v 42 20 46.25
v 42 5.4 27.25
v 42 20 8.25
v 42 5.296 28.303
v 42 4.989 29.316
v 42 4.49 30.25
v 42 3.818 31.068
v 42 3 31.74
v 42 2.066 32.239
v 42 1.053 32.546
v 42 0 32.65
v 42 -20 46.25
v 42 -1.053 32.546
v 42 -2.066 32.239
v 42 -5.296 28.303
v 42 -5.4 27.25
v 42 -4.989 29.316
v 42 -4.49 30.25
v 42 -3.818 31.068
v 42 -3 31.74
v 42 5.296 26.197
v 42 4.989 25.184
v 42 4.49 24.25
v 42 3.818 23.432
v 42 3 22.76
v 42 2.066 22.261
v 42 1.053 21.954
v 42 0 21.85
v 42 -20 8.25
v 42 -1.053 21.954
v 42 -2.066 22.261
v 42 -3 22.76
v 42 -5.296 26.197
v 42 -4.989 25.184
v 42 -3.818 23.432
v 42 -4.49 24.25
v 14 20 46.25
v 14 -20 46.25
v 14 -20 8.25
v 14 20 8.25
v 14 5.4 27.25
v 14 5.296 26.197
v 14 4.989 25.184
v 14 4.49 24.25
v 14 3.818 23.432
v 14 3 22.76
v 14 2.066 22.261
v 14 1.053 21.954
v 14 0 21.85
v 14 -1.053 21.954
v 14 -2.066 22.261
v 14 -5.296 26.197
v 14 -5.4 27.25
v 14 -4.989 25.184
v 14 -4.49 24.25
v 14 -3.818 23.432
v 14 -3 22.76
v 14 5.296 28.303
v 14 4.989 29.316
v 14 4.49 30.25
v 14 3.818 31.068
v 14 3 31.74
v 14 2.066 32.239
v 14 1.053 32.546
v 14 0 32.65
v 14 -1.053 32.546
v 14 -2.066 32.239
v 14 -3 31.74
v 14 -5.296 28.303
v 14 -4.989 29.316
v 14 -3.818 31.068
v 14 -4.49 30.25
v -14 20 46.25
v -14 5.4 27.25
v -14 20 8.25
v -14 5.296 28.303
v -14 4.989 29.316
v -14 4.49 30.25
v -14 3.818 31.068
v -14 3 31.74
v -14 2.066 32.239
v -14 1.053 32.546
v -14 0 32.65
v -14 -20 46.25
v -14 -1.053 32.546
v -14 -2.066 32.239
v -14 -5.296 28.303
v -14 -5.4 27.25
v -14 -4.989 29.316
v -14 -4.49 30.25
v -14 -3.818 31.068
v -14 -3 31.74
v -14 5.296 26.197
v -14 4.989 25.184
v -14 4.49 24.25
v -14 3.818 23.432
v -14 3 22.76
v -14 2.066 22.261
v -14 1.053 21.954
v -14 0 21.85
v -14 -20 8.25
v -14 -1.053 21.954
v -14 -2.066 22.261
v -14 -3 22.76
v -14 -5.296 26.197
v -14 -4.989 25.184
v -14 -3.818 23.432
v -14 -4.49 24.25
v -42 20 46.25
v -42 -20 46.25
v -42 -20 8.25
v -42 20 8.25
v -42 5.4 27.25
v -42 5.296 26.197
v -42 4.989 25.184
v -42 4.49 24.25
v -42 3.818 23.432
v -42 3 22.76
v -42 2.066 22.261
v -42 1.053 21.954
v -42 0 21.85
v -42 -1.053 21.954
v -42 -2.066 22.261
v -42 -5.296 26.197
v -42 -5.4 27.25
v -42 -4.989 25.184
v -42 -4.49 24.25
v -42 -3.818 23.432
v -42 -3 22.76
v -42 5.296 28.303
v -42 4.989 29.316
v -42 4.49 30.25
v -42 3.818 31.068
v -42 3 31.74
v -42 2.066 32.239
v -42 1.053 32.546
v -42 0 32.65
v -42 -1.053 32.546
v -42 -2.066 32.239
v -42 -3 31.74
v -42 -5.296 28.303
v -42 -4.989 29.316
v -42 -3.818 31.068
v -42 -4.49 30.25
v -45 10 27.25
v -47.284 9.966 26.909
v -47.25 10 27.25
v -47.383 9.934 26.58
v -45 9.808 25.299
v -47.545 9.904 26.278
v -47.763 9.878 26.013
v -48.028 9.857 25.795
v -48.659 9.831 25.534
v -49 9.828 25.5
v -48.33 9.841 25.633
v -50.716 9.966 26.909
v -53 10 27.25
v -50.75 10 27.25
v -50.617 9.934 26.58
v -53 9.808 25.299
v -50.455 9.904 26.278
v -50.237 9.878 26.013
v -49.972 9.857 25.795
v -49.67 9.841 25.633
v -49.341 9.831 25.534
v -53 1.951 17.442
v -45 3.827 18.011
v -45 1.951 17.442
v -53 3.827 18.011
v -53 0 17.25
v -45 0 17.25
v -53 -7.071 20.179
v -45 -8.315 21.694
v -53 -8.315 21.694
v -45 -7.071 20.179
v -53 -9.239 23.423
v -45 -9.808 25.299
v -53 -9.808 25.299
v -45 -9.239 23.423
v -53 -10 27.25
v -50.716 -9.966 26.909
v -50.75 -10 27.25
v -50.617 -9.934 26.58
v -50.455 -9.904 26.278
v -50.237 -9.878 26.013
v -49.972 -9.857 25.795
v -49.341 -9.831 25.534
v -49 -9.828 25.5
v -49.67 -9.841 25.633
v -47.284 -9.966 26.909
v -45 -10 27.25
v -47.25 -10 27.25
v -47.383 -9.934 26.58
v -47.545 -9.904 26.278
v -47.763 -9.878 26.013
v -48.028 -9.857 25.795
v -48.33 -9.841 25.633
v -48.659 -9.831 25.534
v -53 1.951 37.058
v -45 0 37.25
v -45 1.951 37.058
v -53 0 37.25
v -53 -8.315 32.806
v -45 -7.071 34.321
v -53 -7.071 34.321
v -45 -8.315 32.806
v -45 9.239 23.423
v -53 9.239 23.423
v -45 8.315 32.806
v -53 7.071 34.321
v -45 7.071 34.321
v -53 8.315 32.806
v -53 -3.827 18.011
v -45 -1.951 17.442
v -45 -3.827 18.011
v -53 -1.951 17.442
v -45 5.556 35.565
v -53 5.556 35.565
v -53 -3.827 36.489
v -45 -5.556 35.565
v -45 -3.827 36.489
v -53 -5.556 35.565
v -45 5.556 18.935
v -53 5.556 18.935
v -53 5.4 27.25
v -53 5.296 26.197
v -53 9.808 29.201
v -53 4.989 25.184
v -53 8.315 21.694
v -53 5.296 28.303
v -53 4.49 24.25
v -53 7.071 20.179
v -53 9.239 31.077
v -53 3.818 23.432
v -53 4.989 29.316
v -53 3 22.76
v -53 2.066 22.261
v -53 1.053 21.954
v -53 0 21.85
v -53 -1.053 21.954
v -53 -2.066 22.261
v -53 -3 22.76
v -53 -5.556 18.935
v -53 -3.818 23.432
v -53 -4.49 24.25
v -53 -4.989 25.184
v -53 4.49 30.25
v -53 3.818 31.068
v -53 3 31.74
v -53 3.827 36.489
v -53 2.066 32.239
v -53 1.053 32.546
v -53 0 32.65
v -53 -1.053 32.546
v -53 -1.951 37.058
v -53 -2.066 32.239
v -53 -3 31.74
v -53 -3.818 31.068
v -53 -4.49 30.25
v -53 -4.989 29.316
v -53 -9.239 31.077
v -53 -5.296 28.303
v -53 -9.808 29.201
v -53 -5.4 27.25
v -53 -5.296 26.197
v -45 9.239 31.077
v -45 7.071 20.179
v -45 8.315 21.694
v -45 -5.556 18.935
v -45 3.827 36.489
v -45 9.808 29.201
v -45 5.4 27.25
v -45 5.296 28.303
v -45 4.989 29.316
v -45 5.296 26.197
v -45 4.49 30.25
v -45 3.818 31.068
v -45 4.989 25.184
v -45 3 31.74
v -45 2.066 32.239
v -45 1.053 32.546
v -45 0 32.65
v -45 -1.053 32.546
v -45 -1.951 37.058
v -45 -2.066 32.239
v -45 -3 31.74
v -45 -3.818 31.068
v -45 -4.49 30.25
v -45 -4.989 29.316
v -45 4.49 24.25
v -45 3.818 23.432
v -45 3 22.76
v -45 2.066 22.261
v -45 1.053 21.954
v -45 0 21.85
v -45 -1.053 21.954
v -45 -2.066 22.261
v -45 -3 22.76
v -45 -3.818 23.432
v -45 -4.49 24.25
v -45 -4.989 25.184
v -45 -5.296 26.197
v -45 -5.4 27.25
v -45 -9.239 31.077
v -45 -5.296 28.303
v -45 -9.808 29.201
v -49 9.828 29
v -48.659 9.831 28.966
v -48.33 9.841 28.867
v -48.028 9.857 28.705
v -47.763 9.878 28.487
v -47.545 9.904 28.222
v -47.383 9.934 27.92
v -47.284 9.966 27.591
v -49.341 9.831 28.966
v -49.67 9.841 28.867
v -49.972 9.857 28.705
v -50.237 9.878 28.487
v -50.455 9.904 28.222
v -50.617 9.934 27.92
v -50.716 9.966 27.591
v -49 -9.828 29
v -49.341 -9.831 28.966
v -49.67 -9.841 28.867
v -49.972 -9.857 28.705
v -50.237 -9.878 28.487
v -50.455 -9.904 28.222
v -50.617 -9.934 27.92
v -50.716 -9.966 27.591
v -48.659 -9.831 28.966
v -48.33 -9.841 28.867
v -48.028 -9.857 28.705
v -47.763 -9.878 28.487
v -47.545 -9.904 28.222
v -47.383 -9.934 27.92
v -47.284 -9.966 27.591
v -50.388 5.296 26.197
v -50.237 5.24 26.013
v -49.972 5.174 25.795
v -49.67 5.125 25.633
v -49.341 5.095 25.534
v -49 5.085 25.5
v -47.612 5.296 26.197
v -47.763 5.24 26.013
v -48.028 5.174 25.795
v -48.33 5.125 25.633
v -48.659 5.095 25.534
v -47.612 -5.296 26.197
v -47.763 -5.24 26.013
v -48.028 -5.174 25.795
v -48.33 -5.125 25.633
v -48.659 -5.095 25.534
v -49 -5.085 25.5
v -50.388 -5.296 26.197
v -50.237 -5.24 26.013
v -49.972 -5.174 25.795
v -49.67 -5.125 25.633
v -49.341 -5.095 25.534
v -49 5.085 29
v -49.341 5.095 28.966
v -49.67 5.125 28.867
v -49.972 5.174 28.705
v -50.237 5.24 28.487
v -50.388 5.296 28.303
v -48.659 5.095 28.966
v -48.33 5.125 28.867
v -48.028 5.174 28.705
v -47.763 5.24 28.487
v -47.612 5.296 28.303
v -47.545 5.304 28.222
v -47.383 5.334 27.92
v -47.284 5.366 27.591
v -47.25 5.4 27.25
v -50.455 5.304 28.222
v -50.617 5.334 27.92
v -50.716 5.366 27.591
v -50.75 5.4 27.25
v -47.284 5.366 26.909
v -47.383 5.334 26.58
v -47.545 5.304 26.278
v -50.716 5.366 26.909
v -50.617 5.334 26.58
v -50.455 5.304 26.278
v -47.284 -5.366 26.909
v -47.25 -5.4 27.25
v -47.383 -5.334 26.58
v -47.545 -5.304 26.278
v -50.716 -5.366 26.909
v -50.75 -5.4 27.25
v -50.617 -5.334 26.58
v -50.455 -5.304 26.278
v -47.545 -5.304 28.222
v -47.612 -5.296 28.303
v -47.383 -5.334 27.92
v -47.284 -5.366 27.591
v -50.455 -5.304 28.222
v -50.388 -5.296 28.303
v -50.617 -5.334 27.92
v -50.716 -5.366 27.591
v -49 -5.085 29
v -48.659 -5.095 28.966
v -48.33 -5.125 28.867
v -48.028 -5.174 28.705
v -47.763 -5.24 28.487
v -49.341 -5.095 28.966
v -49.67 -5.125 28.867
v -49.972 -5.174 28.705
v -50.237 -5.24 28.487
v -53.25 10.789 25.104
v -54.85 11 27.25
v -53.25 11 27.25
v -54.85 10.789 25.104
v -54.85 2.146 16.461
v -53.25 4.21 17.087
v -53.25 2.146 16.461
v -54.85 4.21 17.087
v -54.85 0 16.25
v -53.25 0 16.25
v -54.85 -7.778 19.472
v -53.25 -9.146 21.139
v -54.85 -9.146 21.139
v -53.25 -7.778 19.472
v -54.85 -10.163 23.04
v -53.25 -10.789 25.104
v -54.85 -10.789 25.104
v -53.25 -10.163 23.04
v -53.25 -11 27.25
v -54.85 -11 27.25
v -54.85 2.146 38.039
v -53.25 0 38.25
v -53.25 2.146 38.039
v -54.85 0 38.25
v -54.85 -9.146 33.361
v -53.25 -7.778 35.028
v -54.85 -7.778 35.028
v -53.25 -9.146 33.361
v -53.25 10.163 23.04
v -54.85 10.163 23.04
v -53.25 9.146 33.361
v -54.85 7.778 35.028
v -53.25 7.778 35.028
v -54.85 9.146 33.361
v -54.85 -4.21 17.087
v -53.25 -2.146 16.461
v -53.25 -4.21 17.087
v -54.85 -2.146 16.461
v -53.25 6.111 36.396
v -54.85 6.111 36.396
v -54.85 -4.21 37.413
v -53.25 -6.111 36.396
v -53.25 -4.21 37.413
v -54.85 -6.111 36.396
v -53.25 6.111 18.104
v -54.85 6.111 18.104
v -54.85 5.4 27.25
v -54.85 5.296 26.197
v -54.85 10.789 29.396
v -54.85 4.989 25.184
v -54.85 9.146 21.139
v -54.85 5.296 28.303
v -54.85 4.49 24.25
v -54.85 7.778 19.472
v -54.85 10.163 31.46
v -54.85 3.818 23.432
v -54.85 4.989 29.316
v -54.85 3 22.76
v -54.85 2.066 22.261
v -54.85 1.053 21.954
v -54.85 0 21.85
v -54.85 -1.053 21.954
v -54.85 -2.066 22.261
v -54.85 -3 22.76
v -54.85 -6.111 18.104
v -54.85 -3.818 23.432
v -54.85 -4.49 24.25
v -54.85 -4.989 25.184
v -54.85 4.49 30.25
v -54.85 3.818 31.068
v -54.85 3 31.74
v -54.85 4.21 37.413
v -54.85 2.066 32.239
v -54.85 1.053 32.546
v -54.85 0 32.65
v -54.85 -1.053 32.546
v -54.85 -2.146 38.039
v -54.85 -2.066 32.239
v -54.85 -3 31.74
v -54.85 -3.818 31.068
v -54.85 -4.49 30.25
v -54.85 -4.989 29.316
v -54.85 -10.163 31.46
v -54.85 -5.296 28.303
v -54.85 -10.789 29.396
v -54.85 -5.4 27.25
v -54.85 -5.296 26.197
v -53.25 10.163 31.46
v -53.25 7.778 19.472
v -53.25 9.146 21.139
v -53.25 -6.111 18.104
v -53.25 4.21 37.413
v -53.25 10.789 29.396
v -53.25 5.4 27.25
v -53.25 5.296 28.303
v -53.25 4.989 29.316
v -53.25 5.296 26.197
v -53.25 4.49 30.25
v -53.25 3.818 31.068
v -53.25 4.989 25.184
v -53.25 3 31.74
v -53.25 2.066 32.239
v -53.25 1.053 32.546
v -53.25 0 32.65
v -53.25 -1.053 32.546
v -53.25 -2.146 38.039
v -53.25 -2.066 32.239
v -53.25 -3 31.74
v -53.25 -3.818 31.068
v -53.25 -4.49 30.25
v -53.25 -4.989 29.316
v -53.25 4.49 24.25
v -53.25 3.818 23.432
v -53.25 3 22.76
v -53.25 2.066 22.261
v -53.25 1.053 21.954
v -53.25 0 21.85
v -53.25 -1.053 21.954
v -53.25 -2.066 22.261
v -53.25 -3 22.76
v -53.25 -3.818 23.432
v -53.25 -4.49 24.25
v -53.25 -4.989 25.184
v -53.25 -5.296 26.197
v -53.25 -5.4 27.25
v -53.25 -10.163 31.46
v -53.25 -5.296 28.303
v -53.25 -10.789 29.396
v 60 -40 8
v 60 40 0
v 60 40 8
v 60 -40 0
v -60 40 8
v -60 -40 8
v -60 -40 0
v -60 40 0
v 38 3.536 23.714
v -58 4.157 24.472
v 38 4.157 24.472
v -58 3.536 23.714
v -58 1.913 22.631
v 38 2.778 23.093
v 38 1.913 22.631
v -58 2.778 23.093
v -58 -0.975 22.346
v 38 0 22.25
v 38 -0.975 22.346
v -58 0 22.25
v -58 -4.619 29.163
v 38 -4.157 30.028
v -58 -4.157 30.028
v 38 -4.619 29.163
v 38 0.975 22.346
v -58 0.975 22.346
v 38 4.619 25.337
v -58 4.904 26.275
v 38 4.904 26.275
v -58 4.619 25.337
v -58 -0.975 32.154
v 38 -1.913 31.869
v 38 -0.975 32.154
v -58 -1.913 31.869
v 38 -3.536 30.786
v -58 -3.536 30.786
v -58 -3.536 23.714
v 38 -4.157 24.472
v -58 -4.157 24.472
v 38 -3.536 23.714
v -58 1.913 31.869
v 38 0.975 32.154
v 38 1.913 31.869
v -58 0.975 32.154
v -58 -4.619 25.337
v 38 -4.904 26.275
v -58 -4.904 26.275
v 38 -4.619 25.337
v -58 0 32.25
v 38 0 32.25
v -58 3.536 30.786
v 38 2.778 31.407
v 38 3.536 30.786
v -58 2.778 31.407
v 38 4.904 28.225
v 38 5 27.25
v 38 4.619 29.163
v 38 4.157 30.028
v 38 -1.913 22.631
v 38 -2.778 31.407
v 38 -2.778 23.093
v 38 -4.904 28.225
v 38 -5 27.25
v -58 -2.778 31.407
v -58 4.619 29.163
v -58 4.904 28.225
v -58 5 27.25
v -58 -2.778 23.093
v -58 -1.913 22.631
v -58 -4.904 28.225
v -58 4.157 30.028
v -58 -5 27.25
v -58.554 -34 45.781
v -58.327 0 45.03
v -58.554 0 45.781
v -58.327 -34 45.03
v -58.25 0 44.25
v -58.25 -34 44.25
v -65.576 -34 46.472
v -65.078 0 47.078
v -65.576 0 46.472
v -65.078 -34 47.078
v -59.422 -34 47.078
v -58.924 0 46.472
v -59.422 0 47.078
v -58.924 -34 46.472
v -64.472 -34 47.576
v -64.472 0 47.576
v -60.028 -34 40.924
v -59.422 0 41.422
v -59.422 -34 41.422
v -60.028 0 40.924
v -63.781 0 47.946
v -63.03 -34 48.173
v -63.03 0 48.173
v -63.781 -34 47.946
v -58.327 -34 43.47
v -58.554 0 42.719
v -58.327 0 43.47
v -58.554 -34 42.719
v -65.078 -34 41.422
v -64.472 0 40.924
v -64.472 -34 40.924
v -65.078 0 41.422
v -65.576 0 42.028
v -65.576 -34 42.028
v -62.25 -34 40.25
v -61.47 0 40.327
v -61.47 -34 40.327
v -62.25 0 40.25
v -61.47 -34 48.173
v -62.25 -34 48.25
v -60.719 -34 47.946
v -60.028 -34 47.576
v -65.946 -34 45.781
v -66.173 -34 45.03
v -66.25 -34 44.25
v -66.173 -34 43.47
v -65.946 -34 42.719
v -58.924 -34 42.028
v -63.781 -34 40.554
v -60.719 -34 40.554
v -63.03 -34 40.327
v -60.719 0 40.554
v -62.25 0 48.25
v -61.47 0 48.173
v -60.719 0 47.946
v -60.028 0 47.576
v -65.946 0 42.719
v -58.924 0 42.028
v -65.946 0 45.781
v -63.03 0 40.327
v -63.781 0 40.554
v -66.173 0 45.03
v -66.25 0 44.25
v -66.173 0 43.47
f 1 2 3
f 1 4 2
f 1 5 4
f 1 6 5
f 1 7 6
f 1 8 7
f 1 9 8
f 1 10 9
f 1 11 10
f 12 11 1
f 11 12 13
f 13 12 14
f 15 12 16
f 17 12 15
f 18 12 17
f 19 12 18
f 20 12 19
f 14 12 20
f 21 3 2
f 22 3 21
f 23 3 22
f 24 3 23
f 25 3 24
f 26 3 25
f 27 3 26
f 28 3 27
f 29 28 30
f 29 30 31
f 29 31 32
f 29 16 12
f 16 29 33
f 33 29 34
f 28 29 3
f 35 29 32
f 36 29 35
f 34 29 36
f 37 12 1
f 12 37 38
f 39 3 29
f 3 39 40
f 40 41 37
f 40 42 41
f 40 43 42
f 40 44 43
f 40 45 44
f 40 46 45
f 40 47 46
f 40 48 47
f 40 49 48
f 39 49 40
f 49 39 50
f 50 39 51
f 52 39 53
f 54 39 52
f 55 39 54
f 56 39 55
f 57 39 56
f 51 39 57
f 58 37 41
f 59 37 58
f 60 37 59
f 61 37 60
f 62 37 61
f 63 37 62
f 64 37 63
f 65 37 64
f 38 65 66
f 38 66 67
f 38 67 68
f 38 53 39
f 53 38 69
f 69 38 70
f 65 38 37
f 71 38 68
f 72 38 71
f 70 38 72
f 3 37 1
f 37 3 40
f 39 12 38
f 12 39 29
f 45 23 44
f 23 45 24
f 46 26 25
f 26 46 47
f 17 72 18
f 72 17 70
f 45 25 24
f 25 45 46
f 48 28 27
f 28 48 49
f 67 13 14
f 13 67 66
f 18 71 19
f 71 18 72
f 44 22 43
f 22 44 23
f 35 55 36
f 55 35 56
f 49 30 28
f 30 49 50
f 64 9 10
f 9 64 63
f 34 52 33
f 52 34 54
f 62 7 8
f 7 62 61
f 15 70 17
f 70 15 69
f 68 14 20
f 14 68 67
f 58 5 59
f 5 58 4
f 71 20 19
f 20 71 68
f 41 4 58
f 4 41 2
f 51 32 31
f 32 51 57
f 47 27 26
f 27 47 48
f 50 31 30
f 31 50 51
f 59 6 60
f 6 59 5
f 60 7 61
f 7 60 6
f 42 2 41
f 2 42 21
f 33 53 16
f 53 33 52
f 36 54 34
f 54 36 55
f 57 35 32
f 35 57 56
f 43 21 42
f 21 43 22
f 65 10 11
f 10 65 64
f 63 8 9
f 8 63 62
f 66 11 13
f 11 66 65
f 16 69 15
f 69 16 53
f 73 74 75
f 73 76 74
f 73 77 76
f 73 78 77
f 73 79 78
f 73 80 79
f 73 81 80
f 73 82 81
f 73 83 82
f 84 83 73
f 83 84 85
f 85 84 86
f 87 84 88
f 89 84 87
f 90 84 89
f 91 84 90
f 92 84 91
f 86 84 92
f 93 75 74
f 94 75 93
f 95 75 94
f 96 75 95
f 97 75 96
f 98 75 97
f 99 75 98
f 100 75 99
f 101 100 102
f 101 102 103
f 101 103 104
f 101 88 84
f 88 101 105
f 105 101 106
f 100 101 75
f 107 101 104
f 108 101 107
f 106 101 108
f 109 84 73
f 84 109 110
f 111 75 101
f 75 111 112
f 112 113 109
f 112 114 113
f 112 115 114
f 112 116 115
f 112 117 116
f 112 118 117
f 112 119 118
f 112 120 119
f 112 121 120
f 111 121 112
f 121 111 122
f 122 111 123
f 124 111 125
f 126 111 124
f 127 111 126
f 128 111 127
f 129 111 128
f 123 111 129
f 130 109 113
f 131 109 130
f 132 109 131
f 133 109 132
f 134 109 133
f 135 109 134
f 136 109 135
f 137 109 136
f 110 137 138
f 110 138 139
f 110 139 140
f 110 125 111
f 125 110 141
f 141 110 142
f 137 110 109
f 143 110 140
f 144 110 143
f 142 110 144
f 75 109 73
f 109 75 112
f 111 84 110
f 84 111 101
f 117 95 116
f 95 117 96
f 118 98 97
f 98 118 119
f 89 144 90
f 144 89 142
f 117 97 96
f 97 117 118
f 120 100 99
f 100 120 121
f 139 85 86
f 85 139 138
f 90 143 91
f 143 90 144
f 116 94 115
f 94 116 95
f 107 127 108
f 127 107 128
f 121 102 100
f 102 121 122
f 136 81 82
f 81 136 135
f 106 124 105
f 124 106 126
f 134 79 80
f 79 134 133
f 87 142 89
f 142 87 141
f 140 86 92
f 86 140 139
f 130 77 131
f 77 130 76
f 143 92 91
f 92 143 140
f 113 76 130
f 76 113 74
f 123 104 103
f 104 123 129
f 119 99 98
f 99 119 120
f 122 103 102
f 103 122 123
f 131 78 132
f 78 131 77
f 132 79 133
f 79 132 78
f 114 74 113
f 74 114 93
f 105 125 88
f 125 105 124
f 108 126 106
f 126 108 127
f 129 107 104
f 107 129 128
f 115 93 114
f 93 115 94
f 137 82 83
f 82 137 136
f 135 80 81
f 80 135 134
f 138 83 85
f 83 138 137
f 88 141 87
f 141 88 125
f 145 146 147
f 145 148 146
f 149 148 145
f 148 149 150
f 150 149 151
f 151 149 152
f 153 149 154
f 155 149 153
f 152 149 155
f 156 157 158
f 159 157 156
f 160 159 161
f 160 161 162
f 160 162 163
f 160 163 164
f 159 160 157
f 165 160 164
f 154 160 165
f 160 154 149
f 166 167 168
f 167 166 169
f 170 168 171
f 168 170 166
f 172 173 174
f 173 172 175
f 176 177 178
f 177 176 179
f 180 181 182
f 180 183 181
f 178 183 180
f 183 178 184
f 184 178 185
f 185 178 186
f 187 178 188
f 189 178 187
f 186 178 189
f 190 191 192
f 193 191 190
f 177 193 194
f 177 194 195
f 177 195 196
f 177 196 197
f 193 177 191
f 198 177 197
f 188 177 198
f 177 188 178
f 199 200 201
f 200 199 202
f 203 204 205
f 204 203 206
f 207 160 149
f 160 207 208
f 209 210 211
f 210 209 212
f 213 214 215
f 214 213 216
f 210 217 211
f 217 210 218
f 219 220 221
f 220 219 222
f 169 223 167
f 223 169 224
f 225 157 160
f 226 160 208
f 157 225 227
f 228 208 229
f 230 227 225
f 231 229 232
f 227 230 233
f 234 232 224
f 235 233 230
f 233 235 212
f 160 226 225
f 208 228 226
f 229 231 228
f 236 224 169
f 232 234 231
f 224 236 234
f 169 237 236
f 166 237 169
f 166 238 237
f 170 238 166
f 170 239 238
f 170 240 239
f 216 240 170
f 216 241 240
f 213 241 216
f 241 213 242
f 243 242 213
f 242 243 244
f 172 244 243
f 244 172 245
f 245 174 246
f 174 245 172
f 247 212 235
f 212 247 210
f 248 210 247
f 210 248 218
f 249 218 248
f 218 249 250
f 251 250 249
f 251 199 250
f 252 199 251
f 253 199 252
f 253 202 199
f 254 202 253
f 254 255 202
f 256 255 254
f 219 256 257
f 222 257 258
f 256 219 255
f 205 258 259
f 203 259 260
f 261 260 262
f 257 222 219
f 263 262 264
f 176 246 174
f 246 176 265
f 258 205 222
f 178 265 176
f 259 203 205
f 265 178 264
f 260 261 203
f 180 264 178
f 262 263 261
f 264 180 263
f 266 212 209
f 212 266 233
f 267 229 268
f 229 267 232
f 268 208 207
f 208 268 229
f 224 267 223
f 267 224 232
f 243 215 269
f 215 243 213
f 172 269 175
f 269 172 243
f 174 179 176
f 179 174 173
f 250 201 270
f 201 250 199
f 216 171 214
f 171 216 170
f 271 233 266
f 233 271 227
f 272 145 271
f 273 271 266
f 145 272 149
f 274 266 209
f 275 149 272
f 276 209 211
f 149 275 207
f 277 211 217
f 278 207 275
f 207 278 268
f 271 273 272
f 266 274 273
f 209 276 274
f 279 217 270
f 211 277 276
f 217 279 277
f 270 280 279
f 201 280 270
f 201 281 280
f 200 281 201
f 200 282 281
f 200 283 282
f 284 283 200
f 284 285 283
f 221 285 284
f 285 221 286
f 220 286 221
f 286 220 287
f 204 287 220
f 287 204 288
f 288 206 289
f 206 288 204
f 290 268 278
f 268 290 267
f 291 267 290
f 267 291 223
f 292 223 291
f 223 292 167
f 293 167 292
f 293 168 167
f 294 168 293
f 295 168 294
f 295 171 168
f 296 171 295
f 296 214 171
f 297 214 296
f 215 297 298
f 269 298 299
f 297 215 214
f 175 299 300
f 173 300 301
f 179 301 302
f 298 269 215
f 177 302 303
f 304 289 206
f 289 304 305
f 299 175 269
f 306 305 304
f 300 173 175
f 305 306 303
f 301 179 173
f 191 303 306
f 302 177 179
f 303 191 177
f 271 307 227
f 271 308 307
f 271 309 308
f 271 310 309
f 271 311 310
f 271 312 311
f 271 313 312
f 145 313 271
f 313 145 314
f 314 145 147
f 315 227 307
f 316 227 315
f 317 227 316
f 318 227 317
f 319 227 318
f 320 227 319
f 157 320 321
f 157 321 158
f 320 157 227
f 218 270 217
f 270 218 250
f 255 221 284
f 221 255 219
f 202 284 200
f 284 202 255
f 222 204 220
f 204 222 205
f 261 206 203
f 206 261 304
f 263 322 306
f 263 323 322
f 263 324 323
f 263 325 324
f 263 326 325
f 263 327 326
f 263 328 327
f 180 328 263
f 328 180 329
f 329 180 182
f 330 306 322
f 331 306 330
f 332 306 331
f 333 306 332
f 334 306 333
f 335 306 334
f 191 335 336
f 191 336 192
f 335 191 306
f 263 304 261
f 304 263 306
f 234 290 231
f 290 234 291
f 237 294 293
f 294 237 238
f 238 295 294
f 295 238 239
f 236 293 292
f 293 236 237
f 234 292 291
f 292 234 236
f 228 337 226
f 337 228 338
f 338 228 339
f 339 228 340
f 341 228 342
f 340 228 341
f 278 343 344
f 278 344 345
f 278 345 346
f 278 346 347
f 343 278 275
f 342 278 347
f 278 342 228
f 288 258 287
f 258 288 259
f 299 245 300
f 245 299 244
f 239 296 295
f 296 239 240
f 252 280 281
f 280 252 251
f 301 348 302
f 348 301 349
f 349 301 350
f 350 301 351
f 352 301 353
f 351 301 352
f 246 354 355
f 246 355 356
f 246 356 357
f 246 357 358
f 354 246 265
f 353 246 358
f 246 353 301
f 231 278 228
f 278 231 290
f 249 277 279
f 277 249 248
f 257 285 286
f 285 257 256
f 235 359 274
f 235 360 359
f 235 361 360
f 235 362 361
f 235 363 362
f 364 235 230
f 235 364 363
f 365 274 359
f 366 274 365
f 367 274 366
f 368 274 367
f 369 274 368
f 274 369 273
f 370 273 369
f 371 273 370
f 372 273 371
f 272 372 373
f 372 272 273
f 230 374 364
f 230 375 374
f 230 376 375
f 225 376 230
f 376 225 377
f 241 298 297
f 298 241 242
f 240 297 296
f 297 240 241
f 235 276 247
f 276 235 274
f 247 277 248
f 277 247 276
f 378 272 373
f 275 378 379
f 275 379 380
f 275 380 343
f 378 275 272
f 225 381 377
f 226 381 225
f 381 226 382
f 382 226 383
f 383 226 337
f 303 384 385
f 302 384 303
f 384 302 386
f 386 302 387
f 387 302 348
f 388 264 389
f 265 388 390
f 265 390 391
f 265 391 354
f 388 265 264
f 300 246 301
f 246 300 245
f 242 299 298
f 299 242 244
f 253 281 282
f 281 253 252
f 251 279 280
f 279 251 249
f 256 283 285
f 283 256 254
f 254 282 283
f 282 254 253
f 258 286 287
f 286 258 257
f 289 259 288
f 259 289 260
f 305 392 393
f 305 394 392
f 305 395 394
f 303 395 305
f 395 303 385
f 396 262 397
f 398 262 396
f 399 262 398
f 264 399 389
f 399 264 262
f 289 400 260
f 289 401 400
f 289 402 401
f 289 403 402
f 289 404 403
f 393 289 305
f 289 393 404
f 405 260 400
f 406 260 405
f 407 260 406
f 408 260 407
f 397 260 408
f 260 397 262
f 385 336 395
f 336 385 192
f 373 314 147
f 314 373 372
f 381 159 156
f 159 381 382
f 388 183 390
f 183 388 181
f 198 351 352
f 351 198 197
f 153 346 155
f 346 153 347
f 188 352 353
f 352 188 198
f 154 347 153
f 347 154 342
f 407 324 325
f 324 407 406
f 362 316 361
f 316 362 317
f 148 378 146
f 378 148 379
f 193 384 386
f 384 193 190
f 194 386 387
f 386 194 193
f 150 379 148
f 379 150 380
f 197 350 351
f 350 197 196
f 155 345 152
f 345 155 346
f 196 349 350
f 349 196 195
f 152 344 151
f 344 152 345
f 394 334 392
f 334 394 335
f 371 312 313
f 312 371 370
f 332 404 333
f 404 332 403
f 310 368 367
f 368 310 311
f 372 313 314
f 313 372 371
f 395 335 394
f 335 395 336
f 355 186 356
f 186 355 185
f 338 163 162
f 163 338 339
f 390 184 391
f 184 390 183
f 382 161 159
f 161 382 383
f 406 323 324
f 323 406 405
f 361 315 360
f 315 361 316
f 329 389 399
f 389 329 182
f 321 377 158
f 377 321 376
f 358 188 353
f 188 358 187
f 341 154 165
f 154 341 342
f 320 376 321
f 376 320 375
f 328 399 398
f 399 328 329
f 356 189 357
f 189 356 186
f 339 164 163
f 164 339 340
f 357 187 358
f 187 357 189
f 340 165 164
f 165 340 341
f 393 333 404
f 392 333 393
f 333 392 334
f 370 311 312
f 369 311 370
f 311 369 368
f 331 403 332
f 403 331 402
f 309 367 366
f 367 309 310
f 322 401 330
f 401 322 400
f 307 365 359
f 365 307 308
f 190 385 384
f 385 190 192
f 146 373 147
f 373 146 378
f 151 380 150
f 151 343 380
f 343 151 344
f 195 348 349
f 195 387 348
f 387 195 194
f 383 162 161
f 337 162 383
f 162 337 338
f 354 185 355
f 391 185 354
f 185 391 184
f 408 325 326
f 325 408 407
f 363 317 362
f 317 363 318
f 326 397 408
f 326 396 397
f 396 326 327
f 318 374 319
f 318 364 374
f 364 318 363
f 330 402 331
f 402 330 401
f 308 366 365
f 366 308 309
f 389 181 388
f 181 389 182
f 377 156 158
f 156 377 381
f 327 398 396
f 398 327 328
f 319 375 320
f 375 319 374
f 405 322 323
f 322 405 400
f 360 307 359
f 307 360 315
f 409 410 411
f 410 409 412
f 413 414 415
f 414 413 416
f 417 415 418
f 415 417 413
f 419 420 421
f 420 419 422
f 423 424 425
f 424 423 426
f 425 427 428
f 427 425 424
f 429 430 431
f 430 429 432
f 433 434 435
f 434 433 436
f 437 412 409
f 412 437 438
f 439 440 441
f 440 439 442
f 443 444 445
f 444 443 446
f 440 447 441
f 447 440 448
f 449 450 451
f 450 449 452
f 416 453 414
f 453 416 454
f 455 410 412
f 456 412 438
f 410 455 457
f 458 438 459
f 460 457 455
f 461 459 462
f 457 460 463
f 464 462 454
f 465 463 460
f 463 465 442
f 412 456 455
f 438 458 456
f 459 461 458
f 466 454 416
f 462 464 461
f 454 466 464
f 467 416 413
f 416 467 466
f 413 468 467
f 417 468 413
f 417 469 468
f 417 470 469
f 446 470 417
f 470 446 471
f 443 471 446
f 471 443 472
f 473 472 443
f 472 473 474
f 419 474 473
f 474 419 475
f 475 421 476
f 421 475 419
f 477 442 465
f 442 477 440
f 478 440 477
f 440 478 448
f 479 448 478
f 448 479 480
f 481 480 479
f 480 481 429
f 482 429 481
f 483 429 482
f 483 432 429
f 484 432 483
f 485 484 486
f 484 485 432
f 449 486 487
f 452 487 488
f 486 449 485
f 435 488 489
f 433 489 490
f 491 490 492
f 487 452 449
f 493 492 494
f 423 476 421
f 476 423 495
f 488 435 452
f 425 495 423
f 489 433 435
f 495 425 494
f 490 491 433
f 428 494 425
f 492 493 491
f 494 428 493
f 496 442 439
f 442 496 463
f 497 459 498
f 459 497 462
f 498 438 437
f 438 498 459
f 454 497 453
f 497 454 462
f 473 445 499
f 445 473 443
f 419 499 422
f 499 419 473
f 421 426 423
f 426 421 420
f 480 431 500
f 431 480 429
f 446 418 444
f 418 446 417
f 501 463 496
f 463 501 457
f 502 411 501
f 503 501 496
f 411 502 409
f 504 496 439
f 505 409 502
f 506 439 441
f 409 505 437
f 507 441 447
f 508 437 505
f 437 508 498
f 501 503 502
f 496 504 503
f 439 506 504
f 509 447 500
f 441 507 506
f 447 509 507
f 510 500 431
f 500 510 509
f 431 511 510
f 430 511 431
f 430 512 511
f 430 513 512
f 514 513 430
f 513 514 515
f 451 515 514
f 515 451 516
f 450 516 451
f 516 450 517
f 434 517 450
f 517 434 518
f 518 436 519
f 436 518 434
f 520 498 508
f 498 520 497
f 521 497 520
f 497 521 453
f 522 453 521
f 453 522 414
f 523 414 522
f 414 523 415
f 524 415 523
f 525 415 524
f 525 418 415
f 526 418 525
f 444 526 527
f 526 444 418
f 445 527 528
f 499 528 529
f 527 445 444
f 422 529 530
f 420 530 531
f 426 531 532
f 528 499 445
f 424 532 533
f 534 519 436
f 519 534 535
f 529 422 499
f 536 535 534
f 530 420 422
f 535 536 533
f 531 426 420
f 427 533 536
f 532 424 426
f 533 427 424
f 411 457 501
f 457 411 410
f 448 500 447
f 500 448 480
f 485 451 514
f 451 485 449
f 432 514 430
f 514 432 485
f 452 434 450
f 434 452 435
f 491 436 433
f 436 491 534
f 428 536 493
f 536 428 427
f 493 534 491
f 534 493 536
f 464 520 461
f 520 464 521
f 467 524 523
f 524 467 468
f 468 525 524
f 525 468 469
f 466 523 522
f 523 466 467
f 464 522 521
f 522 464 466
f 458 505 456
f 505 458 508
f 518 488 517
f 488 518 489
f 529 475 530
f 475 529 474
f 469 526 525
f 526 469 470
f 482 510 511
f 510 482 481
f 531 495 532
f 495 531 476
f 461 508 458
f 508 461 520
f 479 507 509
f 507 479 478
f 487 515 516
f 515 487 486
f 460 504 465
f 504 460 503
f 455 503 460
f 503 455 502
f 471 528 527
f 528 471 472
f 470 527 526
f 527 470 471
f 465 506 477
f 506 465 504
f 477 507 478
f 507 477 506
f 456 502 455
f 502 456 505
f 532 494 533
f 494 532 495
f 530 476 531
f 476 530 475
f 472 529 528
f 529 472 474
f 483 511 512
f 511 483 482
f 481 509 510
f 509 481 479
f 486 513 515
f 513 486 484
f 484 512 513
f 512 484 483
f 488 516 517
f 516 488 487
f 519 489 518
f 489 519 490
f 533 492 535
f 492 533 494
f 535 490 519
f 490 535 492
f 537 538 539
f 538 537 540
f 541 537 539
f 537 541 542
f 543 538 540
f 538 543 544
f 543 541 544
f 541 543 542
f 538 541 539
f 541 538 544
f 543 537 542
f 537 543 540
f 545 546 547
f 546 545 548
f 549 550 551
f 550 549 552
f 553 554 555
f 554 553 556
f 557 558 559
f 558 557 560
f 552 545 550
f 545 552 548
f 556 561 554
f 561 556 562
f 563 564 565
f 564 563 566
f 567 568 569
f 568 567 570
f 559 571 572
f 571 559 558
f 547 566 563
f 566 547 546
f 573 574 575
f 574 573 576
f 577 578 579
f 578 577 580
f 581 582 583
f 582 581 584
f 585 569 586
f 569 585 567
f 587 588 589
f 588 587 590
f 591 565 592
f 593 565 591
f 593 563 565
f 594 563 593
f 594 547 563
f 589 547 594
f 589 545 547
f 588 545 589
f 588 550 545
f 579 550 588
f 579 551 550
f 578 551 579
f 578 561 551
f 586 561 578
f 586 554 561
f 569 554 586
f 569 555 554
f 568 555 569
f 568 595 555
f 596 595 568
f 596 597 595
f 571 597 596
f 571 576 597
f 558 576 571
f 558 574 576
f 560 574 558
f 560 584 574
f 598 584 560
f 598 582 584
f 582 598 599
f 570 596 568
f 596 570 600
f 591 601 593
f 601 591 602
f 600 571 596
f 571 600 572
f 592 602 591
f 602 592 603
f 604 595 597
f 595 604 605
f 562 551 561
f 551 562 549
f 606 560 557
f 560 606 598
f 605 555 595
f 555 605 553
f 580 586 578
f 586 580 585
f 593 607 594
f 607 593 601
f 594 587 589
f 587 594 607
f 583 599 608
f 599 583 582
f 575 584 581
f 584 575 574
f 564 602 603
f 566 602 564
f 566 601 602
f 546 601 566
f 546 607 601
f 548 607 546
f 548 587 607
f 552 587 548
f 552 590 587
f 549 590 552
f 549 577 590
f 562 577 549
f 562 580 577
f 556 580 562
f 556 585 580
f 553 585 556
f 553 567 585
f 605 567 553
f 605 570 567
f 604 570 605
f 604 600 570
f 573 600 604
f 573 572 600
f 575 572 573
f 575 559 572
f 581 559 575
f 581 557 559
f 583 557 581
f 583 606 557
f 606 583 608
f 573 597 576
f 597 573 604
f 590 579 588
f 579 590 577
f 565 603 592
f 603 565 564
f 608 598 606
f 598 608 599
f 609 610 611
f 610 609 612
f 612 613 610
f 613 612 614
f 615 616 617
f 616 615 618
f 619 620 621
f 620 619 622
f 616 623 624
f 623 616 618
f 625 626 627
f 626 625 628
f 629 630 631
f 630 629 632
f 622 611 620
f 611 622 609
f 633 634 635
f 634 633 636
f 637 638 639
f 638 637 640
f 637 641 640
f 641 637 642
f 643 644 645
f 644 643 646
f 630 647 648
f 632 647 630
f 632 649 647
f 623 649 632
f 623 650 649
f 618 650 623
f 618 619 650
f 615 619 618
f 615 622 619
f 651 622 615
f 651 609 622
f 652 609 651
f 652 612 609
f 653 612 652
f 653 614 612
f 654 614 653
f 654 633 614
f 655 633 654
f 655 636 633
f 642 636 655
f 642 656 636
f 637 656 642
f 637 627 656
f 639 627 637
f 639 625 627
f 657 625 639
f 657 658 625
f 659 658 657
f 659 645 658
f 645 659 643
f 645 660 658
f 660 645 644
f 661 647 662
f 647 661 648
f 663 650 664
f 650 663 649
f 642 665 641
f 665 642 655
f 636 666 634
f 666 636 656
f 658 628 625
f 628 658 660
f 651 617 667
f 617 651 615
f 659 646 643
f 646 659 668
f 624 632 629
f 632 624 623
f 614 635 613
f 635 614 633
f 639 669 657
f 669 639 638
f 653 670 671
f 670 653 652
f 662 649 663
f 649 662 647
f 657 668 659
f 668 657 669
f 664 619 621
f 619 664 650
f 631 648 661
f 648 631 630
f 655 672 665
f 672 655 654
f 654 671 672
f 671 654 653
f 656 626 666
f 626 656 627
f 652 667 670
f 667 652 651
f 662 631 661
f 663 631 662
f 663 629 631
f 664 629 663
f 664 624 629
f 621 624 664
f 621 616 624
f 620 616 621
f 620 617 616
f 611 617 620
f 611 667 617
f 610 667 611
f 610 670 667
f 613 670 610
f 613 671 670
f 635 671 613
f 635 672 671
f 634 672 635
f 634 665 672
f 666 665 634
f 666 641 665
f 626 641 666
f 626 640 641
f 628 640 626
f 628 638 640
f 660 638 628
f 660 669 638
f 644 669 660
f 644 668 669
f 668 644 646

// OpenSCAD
$fn = 32;

// ------------------------------------------------------------------------
// Machine vise: screw d10, jaws 28 x 38 mm
// Every part is its own module, assembly() places every instance.
// ------------------------------------------------------------------------

// --- part 1 ---
module vise_bed() {
  difference() {
    translate([-60, -40, 0]) cube([120, 80, 8]);
  }
}

// --- part 2 ---
module vise_jaw() {
  difference() {
    translate([-14, -20, 0]) cube([28, 40, 38]);
    translate([0, 0, 19]) rotate([0, 90, 0]) cylinder(h = 30, d = 10.8, center = true);
  }
}

// --- part 3 ---
module vise_screw() {
  translate([0, 0, -48]) cylinder(h = 96, d = 10);
}

// --- part 4 ---
module screw_collar() {
  difference() {
    cylinder(h = 8, d = 20);
    translate([0, 0, -1]) cylinder(h = 10, d = 10.8);
    translate([0, 0, 4]) rotate([90, 0, 0]) cylinder(h = 22, d = 3.5, center = true);
  }
}

// --- part 5 ---
module screw_washer() {
  difference() {
      translate([0, 0, 0]) cylinder(h = 1.6, d = 22);
      translate([0, 0, -1]) cylinder(h = 3.6, d = 10.8);
    }
}

// --- part 6 ---
module vise_handle() {
  cylinder(h = 34, d = 8);
}

// --- assembly ---
module assembly() {
  color([0.80, 0.24, 0.20]) translate([0, 0, 0]) rotate([0, 0, 0]) vise_bed();
  color([0.20, 0.45, 0.75]) translate([28, 0, 8.25]) rotate([0, 0, 0]) vise_jaw();
  color([0.25, 0.62, 0.32]) translate([-28, 0, 8.25]) rotate([0, 0, 0]) vise_jaw();
  color([0.92, 0.70, 0.18]) translate([-10, 0, 27.25]) rotate([0, 90, 0]) vise_screw();
  color([0.58, 0.35, 0.70]) translate([-53, 0, 27.25]) rotate([0, 90, 0]) screw_collar();
  color([0.16, 0.66, 0.66]) translate([-54.85, 0, 27.25]) rotate([0, 90, 0]) screw_washer();
  color([0.85, 0.48, 0.18]) translate([-62.25, 0, 44.25]) rotate([90, 0, 0]) vise_handle();
}

assembly();
